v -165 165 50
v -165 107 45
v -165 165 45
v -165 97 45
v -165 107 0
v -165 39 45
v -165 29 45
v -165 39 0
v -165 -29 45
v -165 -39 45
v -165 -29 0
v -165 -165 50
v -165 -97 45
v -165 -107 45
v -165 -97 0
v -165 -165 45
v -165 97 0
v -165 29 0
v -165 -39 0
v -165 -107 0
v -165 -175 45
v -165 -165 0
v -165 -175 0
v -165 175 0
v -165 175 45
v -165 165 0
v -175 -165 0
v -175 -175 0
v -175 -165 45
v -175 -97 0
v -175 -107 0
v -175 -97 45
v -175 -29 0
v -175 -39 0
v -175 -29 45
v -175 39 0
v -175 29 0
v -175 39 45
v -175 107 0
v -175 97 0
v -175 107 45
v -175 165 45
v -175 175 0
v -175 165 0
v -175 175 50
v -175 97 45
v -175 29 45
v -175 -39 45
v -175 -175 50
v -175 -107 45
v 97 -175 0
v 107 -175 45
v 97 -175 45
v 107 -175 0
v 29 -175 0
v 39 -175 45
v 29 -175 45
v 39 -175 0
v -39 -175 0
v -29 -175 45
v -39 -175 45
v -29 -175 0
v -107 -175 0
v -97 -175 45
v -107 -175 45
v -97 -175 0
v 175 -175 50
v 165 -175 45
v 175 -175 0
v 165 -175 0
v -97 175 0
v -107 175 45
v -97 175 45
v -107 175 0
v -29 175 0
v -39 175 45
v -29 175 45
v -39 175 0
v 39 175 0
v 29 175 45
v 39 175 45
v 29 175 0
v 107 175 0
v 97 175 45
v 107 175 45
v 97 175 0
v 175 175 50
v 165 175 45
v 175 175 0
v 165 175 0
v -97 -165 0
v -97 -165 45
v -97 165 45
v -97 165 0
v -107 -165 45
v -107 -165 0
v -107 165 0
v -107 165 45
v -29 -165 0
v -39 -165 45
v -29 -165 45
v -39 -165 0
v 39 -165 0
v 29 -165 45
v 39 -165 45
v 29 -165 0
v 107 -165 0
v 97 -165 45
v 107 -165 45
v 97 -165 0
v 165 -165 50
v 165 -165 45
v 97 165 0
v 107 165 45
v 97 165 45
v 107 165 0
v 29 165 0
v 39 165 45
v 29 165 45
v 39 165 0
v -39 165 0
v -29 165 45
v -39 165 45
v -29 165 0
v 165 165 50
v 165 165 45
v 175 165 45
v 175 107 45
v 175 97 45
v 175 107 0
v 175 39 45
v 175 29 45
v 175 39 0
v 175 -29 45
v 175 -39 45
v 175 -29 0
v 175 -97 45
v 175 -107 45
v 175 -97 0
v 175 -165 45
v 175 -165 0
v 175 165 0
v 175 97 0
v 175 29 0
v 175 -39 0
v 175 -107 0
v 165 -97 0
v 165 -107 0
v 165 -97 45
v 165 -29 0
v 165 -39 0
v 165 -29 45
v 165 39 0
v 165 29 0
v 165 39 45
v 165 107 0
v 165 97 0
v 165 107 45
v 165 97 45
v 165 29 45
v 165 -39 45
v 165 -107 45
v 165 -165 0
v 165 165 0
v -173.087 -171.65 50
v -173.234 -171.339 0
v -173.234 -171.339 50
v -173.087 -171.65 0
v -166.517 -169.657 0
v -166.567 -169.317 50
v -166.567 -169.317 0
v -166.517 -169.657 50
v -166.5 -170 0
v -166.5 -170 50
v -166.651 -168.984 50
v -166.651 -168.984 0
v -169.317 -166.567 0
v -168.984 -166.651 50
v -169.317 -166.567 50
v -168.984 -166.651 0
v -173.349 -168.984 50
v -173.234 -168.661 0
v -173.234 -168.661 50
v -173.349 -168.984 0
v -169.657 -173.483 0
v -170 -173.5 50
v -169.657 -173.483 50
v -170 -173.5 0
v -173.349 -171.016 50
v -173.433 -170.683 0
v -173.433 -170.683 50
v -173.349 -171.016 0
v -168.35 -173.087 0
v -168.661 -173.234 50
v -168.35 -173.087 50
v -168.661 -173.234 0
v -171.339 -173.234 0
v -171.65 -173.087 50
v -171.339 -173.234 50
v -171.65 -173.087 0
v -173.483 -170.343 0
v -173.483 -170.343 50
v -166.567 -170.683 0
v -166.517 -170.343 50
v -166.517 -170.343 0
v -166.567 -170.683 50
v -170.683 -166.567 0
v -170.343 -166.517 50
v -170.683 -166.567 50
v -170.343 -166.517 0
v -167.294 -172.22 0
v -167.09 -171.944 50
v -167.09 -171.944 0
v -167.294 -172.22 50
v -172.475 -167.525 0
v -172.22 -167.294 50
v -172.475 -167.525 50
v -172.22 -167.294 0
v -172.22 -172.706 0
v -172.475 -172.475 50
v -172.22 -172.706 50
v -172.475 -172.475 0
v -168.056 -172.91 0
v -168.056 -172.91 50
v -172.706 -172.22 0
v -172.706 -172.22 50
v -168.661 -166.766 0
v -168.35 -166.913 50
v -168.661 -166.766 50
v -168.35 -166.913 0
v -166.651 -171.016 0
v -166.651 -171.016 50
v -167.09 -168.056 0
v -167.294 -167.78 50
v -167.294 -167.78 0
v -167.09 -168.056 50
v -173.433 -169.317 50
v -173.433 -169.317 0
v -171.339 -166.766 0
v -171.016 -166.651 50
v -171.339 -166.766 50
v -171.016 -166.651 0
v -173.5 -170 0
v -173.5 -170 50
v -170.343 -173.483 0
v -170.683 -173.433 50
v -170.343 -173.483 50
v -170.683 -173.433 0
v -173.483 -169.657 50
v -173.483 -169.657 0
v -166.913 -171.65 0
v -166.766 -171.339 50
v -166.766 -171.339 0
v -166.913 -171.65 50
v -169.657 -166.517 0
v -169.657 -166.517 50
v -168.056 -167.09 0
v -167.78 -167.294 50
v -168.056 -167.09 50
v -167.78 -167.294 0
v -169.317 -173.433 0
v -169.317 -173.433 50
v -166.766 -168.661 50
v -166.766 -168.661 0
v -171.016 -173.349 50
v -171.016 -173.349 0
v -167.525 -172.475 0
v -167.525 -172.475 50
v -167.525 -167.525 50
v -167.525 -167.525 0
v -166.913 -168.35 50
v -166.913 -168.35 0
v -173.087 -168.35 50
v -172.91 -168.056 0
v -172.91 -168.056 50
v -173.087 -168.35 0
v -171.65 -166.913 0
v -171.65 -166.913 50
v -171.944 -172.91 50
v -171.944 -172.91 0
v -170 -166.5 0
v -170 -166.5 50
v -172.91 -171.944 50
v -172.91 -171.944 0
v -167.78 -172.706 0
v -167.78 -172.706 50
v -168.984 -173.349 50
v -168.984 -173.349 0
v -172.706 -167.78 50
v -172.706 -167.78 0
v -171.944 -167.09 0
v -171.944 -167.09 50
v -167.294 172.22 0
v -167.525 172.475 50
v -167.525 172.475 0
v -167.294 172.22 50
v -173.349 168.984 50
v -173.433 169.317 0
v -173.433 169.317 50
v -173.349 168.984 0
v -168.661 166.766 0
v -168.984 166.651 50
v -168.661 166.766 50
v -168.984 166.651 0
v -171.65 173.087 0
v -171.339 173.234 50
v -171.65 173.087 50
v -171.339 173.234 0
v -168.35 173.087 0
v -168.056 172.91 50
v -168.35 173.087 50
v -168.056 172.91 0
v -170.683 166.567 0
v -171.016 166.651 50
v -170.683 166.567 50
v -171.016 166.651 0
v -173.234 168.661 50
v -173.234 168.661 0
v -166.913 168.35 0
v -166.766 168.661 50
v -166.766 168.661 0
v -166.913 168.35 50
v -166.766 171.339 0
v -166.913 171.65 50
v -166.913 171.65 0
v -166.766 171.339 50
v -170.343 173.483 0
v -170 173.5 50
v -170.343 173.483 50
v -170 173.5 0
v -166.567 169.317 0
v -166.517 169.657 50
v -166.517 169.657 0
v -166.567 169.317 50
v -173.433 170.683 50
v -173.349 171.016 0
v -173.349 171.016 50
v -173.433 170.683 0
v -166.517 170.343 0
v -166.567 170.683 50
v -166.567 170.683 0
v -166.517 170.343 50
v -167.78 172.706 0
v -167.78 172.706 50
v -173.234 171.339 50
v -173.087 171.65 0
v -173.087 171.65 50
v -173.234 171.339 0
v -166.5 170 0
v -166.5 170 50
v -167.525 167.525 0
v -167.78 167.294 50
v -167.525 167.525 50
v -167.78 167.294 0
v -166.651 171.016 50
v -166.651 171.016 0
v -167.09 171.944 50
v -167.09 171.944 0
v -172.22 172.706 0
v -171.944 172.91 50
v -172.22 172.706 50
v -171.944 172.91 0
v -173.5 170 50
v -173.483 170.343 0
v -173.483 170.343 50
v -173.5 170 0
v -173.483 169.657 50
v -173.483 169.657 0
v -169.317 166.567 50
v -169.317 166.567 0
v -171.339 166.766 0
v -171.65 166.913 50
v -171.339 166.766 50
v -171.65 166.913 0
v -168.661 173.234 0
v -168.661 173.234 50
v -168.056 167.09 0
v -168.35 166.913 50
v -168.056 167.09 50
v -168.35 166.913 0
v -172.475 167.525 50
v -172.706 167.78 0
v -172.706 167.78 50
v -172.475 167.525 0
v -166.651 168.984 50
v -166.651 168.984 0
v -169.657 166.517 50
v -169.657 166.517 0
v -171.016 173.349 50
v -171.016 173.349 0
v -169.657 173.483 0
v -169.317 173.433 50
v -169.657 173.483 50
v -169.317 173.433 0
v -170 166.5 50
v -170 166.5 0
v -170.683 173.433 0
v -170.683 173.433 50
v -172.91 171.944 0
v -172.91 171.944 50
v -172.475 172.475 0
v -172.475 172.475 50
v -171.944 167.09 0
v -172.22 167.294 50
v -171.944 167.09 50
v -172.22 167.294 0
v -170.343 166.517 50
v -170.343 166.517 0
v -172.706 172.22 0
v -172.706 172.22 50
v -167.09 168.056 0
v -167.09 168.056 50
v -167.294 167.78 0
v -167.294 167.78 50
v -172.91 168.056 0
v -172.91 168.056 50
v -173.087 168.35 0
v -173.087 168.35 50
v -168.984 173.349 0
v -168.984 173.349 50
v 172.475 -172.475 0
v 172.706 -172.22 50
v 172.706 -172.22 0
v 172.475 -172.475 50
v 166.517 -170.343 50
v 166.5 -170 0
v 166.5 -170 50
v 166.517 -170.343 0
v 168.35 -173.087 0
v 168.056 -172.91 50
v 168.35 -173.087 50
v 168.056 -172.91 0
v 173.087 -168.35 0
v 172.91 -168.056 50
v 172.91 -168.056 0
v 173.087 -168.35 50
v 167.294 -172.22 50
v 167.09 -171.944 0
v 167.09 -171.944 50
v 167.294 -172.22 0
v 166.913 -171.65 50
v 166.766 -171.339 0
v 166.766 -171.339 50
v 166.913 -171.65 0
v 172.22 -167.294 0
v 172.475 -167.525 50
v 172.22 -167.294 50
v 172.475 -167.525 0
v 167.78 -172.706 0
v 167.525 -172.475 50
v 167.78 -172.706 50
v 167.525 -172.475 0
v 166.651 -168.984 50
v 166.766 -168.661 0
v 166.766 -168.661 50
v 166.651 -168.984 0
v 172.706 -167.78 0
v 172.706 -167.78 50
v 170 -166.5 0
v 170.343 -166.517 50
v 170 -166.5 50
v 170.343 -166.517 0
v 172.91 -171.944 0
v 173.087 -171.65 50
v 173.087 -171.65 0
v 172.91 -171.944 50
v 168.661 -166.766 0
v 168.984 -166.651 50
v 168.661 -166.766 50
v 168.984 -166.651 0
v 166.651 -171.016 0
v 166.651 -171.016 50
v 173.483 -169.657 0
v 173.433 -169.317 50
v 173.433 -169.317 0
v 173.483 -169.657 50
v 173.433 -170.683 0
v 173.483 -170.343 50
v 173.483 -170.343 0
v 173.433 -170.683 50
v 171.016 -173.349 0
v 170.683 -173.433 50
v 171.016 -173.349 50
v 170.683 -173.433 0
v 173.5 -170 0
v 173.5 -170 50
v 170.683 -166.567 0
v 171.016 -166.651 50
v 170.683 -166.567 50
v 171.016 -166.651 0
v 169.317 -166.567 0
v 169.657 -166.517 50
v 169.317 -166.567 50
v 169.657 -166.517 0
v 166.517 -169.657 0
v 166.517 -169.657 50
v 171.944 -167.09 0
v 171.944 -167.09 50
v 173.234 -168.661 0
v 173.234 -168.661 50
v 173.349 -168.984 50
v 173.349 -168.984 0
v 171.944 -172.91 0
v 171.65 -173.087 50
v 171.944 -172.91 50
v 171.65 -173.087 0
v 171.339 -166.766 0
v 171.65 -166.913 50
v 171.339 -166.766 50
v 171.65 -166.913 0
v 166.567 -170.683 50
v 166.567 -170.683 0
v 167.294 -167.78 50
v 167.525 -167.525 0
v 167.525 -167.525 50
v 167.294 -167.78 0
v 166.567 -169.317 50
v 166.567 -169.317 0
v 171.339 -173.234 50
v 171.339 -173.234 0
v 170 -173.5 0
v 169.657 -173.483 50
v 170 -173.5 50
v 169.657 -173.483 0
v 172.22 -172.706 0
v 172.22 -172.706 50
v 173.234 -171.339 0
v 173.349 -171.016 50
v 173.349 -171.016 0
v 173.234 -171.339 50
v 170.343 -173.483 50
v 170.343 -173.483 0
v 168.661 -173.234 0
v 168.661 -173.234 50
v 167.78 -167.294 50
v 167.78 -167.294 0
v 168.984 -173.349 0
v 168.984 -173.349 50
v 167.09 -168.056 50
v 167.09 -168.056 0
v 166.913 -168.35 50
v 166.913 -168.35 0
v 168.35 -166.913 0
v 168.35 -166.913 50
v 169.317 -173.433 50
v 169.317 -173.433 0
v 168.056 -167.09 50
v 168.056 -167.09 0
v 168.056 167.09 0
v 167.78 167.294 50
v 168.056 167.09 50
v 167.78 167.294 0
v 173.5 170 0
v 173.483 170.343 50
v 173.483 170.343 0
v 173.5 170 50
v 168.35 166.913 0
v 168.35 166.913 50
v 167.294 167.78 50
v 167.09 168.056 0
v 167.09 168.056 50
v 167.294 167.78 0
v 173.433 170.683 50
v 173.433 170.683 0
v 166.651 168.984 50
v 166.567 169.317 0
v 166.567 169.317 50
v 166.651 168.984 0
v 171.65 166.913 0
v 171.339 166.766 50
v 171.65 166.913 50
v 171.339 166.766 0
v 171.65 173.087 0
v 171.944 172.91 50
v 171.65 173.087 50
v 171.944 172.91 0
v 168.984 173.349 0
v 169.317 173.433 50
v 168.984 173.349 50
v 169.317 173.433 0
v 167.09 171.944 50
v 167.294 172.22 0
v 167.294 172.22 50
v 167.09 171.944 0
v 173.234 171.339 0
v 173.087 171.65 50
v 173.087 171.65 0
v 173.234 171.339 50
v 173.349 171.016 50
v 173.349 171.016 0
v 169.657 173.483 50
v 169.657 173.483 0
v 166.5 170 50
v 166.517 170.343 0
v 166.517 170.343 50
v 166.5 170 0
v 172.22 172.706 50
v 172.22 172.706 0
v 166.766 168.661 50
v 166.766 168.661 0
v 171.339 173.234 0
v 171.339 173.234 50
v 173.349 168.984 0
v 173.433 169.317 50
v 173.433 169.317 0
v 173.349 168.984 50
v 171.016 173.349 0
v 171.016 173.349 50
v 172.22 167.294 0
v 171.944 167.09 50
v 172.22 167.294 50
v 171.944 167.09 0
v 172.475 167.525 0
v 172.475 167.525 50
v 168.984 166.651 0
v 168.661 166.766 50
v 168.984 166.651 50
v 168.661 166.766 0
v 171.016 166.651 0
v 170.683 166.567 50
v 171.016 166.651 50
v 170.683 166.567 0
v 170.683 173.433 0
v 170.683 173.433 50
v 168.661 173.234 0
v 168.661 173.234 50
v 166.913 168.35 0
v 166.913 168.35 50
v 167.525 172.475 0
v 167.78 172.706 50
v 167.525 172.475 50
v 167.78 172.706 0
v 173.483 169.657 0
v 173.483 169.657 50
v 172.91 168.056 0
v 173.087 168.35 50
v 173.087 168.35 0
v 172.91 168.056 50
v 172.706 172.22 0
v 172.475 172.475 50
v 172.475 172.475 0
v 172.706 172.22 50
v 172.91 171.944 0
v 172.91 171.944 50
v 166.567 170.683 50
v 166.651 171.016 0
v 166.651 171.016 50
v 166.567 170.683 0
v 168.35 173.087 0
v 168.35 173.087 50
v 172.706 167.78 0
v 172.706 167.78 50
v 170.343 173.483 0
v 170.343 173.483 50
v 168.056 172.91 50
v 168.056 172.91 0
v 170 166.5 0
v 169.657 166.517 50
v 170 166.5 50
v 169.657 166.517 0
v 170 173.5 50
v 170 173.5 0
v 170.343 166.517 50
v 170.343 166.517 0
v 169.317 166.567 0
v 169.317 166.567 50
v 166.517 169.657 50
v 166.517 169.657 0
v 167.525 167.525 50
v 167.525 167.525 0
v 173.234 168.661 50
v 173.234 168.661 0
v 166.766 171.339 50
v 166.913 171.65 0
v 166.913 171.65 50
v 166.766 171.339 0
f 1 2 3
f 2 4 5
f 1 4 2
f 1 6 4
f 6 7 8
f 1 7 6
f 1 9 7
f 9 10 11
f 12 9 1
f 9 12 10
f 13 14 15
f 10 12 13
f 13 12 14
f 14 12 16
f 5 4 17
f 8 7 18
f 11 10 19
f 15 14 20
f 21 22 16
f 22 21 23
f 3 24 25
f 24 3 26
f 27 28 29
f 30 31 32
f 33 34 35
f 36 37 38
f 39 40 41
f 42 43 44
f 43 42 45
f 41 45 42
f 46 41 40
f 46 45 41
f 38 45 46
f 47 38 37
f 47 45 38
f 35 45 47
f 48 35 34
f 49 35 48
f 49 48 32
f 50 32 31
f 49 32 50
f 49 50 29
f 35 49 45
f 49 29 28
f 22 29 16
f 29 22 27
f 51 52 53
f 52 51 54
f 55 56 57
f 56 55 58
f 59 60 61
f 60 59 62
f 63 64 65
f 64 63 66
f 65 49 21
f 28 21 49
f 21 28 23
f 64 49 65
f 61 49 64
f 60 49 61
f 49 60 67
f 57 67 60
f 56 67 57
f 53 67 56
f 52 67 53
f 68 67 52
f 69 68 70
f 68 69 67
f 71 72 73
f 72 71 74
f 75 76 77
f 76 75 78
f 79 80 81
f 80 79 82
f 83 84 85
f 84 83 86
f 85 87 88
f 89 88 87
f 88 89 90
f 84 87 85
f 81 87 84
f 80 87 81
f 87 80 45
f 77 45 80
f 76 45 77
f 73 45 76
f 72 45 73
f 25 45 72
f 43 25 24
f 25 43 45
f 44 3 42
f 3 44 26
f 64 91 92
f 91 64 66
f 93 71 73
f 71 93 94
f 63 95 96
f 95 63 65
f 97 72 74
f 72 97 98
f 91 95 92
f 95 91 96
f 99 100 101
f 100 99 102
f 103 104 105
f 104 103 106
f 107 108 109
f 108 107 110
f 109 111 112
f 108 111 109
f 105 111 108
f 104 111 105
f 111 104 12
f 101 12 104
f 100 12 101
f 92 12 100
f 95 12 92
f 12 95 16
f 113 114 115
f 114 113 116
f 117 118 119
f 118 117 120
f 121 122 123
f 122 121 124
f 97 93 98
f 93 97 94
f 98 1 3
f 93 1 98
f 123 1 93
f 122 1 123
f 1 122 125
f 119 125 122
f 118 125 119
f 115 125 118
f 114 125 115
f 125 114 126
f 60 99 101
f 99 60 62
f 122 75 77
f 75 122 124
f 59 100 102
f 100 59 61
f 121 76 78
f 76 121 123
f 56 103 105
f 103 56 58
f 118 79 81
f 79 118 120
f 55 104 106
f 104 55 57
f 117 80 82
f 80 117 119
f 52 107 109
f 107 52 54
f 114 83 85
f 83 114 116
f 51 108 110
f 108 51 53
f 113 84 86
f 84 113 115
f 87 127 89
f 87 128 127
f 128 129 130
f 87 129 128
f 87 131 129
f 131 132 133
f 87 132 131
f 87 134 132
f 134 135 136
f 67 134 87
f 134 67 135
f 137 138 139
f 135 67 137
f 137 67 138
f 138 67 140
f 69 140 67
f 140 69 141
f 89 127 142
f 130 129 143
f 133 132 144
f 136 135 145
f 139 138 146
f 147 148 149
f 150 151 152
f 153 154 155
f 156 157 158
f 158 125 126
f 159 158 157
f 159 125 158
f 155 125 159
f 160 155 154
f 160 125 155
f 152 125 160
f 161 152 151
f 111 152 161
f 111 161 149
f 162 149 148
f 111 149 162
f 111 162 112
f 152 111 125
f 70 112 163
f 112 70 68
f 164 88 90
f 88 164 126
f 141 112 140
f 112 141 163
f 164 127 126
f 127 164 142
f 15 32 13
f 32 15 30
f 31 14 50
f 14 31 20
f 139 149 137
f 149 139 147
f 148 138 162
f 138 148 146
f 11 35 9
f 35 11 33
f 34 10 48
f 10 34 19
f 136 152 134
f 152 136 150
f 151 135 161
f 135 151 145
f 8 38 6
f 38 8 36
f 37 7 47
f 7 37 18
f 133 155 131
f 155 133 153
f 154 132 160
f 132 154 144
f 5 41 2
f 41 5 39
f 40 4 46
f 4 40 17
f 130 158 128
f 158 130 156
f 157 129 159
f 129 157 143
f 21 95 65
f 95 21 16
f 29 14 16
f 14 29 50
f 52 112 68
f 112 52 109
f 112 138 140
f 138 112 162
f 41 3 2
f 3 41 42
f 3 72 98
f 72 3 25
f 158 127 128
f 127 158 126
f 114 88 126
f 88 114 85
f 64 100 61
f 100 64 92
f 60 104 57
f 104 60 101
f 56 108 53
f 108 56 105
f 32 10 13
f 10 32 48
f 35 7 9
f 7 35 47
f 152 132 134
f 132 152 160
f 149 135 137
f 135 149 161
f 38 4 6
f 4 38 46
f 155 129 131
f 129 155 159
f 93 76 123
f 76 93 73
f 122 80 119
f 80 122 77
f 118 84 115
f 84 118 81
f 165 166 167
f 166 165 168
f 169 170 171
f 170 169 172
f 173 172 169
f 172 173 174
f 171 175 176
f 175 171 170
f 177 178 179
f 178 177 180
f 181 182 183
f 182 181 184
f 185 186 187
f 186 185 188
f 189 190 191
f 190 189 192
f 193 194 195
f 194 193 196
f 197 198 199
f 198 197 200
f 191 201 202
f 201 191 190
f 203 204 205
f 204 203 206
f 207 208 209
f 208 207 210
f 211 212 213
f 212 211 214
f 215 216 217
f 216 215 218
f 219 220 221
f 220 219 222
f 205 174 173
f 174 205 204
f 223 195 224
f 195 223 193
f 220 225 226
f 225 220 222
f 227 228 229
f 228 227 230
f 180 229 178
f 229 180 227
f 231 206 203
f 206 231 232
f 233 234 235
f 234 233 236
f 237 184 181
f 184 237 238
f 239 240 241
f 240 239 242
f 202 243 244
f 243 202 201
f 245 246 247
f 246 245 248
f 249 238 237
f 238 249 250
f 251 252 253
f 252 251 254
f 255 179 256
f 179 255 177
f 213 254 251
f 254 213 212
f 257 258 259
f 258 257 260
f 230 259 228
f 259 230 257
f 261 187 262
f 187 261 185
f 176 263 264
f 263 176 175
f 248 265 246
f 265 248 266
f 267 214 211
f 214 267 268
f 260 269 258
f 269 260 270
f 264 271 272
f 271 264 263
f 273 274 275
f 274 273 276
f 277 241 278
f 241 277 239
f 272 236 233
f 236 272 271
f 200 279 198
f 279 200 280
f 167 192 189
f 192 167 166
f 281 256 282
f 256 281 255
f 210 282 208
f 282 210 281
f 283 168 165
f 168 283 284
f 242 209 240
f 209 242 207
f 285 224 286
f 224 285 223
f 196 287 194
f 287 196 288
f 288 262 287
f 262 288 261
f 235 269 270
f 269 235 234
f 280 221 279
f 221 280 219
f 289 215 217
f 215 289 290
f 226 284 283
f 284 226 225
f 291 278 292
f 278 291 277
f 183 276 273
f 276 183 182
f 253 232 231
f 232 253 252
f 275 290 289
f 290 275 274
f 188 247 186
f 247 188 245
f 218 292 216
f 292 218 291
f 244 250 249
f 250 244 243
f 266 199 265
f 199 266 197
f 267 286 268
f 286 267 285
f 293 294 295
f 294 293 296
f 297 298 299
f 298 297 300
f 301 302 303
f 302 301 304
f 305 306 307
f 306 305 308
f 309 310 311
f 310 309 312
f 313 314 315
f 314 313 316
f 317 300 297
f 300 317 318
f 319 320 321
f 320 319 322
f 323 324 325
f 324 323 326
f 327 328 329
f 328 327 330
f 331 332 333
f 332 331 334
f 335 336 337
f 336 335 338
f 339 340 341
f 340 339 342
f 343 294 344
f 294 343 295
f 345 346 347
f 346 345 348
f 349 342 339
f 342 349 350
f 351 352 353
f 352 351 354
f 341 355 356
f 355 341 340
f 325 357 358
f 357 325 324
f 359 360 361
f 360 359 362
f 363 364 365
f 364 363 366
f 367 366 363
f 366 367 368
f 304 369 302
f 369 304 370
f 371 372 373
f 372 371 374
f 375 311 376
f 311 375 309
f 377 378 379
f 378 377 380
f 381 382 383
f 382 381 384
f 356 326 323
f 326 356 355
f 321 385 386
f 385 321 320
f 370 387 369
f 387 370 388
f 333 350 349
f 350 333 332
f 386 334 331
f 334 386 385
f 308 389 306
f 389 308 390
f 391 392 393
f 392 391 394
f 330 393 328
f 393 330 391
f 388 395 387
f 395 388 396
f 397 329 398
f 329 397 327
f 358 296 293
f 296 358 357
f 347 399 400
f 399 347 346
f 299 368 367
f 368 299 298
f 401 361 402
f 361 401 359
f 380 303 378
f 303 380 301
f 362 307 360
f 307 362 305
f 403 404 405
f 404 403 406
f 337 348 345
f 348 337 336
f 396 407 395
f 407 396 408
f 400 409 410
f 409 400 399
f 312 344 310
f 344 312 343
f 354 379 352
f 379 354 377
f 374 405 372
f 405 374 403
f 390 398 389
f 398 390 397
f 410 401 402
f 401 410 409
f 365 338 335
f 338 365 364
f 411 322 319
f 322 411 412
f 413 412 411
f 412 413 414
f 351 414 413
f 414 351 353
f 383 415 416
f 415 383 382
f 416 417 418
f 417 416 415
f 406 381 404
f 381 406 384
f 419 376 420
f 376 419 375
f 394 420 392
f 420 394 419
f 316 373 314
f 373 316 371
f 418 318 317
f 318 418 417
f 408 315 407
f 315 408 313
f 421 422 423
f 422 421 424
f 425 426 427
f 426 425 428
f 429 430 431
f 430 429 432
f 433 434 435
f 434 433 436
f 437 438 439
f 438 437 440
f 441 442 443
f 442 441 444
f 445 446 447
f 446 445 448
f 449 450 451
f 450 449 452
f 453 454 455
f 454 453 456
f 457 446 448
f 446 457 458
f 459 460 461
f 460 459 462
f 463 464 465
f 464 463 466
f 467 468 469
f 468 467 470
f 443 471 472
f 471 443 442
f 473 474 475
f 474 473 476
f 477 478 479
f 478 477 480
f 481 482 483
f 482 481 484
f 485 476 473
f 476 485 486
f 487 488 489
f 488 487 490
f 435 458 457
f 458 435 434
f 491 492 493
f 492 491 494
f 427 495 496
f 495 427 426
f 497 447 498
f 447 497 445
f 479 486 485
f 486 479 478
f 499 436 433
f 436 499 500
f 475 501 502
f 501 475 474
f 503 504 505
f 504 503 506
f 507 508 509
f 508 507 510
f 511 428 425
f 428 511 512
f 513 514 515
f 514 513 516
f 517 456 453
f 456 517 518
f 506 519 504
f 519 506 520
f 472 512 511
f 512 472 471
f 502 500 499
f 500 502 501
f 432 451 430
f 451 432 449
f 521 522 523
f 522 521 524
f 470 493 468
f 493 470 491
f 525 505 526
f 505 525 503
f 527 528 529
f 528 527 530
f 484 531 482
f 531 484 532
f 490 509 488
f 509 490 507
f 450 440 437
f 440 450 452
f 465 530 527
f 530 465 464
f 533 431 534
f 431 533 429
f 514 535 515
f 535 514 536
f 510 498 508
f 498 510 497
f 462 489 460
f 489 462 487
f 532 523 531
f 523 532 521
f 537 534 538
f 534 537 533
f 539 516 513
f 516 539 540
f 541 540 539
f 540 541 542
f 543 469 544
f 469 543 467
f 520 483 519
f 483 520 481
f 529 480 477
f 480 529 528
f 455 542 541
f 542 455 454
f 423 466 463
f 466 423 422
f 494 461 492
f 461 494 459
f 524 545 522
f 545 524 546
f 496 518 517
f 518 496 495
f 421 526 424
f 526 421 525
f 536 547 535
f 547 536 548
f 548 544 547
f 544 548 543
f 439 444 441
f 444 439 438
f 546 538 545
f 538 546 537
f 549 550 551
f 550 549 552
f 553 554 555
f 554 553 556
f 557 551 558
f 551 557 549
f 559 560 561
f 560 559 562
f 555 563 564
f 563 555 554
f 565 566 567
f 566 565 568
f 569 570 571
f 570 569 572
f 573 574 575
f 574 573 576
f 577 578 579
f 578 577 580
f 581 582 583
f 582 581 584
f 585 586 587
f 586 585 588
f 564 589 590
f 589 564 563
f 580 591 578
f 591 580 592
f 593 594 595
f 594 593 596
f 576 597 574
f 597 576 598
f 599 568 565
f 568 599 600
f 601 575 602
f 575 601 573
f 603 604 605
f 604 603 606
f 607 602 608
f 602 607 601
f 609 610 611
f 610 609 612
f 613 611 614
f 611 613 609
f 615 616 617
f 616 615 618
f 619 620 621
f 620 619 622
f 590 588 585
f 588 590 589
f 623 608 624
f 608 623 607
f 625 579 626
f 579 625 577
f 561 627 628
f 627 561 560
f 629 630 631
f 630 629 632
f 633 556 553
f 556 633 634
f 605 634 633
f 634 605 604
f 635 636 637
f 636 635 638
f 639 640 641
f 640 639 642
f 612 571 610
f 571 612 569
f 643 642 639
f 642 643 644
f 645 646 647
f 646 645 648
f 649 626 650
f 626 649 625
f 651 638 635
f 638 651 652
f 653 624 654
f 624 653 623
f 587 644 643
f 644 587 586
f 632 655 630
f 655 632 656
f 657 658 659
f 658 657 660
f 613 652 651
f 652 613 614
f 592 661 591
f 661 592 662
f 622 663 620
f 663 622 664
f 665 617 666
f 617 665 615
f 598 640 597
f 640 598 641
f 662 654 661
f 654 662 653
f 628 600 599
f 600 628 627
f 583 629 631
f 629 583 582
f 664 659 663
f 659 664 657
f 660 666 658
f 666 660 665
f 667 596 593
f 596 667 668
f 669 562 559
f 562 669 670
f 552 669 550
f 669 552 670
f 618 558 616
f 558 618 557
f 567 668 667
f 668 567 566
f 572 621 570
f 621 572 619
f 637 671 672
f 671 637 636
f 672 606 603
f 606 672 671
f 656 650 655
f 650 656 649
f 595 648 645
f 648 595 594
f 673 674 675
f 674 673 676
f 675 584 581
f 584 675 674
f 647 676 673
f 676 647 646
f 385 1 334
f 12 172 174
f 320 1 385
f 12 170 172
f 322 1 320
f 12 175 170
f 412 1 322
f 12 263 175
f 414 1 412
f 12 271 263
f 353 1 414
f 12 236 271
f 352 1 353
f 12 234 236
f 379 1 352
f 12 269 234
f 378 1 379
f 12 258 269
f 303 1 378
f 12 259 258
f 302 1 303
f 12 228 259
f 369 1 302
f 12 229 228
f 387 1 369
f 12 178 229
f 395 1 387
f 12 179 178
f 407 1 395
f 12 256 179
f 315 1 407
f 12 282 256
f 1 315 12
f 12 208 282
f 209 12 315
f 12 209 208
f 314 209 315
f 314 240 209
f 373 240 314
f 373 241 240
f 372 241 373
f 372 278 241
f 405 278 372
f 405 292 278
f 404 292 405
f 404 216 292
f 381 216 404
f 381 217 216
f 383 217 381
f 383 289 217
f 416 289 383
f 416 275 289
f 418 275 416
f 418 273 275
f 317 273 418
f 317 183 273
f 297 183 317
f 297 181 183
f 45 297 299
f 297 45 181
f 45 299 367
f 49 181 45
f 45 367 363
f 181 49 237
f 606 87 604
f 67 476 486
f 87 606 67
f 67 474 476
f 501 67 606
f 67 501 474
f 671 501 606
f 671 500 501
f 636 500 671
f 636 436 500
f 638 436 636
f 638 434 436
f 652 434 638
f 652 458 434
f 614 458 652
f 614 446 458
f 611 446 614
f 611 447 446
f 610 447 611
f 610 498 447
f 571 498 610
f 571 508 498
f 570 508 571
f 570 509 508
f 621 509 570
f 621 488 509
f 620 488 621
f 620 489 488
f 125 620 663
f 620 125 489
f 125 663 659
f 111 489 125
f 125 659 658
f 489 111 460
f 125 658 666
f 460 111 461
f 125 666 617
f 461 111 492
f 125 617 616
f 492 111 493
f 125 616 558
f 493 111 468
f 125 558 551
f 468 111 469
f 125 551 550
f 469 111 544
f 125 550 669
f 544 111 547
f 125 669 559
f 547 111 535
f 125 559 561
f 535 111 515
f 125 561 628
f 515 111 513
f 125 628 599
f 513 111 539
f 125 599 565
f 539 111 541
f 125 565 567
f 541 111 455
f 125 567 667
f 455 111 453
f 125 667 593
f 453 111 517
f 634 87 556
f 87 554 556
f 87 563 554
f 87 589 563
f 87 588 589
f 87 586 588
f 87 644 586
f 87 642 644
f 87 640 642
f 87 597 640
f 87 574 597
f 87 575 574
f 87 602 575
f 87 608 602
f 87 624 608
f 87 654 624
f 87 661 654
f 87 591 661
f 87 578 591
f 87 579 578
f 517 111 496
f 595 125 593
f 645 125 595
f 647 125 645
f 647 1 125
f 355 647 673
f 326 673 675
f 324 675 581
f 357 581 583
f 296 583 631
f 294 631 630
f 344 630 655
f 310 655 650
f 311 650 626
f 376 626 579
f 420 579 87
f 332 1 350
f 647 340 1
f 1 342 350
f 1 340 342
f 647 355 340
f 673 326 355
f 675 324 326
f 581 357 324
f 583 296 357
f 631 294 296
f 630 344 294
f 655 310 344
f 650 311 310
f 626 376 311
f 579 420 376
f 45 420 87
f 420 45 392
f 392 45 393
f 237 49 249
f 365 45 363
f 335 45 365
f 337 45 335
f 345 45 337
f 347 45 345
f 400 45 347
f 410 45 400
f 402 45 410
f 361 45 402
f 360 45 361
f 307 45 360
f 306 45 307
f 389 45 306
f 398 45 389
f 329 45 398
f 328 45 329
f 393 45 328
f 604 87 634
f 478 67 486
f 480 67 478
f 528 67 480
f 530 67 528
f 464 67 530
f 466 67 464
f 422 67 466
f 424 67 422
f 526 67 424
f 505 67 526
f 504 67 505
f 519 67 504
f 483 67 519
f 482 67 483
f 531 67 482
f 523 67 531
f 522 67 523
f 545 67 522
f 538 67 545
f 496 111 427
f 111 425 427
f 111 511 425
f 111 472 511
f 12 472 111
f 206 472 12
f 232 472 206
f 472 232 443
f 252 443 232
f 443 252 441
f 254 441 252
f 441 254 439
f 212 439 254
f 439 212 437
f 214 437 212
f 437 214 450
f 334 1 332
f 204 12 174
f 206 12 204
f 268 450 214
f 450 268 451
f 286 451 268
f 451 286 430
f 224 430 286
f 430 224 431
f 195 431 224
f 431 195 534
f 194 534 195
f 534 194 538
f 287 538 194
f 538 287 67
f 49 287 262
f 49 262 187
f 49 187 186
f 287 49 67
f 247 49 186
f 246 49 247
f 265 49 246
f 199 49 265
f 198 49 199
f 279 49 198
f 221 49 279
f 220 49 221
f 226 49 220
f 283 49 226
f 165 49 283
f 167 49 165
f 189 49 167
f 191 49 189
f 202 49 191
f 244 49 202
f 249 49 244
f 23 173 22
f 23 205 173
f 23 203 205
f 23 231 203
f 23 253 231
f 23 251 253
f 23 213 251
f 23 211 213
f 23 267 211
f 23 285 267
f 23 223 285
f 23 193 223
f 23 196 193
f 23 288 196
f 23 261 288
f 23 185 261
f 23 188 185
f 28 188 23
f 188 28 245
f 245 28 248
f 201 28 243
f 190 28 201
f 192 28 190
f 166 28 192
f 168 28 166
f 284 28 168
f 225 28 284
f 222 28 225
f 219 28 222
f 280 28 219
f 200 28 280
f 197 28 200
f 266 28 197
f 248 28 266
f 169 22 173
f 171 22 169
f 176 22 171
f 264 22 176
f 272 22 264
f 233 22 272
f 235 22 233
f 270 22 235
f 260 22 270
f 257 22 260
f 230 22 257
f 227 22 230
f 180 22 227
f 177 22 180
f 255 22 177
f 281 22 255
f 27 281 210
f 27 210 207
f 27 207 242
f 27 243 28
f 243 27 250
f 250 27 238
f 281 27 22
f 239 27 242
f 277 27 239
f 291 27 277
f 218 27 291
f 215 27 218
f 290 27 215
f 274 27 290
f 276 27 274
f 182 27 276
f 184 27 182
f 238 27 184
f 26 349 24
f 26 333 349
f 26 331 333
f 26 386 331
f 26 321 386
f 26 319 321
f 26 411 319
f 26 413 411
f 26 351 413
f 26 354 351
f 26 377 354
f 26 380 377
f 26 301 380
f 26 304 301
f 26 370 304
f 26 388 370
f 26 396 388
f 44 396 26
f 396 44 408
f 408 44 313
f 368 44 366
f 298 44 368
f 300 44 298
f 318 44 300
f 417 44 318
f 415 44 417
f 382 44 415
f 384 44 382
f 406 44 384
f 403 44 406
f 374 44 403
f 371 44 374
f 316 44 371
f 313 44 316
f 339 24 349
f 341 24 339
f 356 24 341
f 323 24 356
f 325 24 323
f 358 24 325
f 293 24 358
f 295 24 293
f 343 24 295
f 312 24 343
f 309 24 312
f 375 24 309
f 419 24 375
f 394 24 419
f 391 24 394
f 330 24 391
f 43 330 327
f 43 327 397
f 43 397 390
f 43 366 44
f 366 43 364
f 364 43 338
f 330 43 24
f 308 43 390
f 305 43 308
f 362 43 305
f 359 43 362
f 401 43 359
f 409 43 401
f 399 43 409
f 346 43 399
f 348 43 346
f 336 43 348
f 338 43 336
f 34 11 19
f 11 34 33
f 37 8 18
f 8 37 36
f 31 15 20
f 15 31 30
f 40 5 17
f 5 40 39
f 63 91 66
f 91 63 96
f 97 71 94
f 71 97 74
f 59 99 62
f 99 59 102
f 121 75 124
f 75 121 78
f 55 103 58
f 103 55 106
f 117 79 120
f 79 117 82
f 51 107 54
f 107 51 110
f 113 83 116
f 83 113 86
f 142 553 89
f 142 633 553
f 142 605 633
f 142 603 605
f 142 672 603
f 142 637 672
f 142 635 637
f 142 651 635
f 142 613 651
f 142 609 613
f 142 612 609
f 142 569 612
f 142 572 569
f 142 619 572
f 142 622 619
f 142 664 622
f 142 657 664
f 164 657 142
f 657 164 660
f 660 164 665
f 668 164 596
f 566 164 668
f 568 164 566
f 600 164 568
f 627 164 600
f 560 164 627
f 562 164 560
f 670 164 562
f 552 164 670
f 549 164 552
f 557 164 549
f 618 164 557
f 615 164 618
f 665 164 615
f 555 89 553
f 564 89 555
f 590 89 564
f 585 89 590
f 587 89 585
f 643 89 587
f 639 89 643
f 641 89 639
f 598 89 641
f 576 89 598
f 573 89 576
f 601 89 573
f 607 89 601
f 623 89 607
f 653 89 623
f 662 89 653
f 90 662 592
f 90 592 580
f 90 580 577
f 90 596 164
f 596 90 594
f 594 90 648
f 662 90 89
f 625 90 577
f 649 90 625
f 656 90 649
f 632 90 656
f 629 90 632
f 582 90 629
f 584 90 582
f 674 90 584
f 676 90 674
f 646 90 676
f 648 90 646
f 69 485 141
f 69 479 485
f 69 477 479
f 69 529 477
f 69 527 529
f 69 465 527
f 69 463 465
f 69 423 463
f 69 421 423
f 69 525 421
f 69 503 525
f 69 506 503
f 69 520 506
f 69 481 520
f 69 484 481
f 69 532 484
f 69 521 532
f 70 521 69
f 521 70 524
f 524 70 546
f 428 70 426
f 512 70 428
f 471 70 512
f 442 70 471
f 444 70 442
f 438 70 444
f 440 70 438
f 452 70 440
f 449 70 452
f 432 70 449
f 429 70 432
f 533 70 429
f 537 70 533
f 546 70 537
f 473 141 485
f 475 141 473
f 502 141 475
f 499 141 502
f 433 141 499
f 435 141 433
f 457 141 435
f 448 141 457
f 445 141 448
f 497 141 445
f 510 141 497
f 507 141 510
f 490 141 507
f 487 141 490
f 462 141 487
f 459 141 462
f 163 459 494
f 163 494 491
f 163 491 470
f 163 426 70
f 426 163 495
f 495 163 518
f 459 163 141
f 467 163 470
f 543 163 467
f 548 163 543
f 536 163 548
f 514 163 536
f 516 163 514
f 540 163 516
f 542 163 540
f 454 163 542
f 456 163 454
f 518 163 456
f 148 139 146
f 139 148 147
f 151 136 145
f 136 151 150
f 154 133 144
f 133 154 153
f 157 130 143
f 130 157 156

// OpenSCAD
// Cage slice - index 6
bar = 10;
outer = 350;
half = outer / 2;
height = 700;

N_xy = 6;
N_z  = 11;

x_spacing = (outer - bar) / (N_xy - 1);
z_spacing = (height - bar) / (N_z  - 1);

xs = [ for (i = [0 : N_xy - 1]) (-half + bar/2 + i * x_spacing) ];
ys = xs;

zs = [ for (k = [0 : N_z - 1]) (bar/2 + k * z_spacing) ];

$fn = 64;

module cage_bars() {
    union() {
        // Vertical bars on front and back faces
        for (xv = xs) {
            translate([xv, -half + bar/2, height/2])
                cube([bar, bar, height], center = true);
            translate([xv,  half - bar/2, height/2])
                cube([bar, bar, height], center = true);
        }

        // Vertical bars on left and right faces
        for (yv = ys) {
            translate([-half + bar/2, yv, height/2])
                cube([bar, bar, height], center = true);
            translate([ half - bar/2, yv, height/2])
                cube([bar, bar, height], center = true);
        }

        // Horizontal x-bars on front and back faces
        for (zv = zs) {
            translate([0, -half + bar/2, zv])
                cube([outer, bar, bar], center = true);
            translate([0,  half - bar/2, zv])
                cube([outer, bar, bar], center = true);
        }

        // Horizontal y-bars on left and right faces
        for (zv = zs) {
            translate([-half + bar/2, 0, zv])
                cube([bar, outer, bar], center = true);
            translate([ half - bar/2, 0, zv])
                cube([bar, outer, bar], center = true);
        }

        // Floor and ceiling extra x-bars at all y positions
        z_floor = bar/2;
        z_ceil  = height - bar/2;
        for (yv = ys) {
            translate([0, yv, z_floor])
                cube([outer, bar, bar], center = true);
            translate([0, yv, z_ceil])
                cube([outer, bar, bar], center = true);
        }

        // Floor and ceiling extra y-bars at all x positions
        for (xv = xs) {
            translate([xv, 0, z_floor])
                cube([bar, outer, bar], center = true);
            translate([xv, 0, z_ceil])
                cube([bar, outer, bar], center = true);
        }
    }
}

module corner_holes() {
    hole_d = 7;
    for (sx = [-1, 1])
        for (sy = [-1, 1])
            translate([sx * (half - bar/2), sy * (half - bar/2), height/2])
                cylinder(h = height + 2, d = hole_d, center = true);
}

module cage_full() {
    difference() {
        cage_bars();
        corner_holes();
    }
}

slice_index = 6;
slice_height = 50;

module cage_slice() {
    translate([0, 0, -slice_index * slice_height]) {
        intersection() {
            cage_full();
            translate([0, 0, slice_index * slice_height + slice_height/2])
                cube([outer + 20, outer + 20, slice_height], center = true);
        }
    }
}

cage_slice();
